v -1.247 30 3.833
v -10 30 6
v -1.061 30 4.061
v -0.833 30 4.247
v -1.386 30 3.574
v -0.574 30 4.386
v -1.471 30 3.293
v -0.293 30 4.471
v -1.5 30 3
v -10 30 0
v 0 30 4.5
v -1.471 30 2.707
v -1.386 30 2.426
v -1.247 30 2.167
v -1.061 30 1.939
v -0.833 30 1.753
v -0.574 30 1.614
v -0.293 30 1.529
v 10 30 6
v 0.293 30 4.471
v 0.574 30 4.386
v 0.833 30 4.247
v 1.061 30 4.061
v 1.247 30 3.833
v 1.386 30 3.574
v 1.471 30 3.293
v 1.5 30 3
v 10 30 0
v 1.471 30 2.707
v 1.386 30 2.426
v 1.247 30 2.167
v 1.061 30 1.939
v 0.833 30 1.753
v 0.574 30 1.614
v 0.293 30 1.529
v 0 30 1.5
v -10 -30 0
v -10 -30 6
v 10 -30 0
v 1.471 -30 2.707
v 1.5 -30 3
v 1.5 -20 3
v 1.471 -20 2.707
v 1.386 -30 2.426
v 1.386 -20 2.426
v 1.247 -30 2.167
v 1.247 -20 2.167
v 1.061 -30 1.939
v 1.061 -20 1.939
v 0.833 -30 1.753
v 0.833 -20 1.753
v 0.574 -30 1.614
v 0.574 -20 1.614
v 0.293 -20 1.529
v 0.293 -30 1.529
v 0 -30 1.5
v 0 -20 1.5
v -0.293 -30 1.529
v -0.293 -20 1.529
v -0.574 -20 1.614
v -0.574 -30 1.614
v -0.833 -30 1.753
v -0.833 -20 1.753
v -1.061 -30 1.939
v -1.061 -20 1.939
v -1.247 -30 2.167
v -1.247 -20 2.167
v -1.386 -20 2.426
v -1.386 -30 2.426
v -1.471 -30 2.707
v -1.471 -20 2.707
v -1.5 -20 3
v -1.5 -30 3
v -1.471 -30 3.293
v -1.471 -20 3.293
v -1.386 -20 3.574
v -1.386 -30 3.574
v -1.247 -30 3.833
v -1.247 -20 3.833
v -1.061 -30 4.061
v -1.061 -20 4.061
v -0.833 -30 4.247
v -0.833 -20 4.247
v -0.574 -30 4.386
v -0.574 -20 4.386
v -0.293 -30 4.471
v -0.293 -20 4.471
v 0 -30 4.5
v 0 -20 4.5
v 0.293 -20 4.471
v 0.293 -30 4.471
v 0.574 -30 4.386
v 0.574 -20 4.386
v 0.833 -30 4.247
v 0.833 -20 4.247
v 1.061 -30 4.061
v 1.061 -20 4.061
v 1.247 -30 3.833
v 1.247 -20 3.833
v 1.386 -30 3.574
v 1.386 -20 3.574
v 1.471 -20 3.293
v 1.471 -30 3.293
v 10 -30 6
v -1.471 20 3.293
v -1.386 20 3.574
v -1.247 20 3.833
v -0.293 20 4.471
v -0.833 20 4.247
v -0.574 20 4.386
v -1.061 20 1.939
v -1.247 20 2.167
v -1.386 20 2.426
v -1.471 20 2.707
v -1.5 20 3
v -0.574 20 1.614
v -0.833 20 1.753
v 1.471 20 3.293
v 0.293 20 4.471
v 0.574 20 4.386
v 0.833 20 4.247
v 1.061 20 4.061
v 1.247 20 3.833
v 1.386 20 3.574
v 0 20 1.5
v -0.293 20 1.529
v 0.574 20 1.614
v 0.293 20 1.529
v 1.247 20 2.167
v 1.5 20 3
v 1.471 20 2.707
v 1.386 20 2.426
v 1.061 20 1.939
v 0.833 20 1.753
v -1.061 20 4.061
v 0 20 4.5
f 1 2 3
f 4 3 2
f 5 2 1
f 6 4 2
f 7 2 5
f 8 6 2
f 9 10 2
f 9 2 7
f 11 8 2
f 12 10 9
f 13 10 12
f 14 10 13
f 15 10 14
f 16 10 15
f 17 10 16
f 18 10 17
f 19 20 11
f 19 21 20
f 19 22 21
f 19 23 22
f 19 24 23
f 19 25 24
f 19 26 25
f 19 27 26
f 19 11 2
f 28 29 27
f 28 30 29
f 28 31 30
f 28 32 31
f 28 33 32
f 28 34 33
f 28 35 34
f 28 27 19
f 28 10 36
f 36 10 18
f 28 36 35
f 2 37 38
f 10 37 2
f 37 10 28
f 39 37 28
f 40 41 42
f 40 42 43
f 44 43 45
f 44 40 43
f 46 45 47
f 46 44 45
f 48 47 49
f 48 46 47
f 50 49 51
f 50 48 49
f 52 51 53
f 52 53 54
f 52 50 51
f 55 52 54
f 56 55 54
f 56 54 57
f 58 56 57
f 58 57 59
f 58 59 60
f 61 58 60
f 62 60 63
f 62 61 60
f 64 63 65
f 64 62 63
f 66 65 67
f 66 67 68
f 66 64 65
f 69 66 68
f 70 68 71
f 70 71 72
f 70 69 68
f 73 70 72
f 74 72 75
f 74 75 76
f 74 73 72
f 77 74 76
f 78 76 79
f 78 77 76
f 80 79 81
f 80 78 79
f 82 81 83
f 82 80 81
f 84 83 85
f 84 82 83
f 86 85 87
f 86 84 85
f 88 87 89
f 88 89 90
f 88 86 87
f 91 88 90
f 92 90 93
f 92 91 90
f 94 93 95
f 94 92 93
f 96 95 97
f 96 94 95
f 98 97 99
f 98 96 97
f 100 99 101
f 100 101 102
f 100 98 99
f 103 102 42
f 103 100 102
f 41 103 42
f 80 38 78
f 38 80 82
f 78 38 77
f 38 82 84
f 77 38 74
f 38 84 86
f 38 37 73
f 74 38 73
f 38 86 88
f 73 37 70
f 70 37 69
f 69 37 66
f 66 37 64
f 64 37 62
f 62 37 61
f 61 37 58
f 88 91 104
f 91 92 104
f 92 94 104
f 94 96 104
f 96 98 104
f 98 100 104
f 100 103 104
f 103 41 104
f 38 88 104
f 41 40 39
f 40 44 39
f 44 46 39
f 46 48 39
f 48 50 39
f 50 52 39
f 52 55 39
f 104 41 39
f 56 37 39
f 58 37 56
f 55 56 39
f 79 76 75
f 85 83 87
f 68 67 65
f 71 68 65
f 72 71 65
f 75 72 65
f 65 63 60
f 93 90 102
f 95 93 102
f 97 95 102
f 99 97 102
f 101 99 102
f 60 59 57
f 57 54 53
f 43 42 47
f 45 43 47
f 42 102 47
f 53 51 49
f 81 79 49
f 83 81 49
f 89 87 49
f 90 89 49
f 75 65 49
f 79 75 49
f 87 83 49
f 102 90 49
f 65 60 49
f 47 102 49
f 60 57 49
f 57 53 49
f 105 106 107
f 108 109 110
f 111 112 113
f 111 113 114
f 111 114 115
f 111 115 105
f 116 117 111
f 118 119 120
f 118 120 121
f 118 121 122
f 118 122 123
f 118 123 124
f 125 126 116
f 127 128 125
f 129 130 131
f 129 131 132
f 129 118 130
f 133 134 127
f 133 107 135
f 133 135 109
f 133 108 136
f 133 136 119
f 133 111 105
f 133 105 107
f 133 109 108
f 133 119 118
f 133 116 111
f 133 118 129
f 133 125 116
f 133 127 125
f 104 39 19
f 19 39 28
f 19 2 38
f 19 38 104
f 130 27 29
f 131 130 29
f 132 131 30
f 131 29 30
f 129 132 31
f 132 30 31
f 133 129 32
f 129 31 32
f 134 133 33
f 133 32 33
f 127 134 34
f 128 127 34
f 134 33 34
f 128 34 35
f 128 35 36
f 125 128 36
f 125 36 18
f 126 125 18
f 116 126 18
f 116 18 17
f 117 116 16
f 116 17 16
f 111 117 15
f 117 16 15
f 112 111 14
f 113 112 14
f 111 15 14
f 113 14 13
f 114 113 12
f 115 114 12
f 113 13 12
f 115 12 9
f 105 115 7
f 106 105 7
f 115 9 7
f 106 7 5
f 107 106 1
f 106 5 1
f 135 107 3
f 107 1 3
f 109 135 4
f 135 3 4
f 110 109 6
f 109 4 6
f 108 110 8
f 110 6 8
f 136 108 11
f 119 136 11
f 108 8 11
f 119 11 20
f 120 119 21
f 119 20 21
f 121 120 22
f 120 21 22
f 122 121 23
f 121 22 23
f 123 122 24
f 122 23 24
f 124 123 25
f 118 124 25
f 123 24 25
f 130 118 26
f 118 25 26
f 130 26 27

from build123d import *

# Parameters (mm, degrees)
SKETCH1_W           = 20
SKETCH1_H           = 60
BOSS_EXTRUDE1_DEPTH = 6
SKETCH2_R           = 1.5
CUT_EXTRUDE1_DEPTH  = 10


with BuildPart() as part:
    # Sketch1 → Boss-Extrude1 (new body)
    with BuildSketch(Plane.XY):
        Rectangle(SKETCH1_W, SKETCH1_H)
    extrude(amount=BOSS_EXTRUDE1_DEPTH)

    # Sketch2 → Cut-Extrude1 (cut)
    with BuildSketch(Plane(origin=(0, 30, 0), x_dir=(1, 0, 0), z_dir=(0, 1, 0))):
        with Locations((0, -3)):
            Circle(SKETCH2_R)
    cut_extrude1 = extrude(amount=-CUT_EXTRUDE1_DEPTH, mode=Mode.SUBTRACT)

    # Mirror1: Cut-Extrude1 across plane
    add(cut_extrude1.mirror(Plane.ZX), mode=Mode.SUBTRACT)


solid = part.part
